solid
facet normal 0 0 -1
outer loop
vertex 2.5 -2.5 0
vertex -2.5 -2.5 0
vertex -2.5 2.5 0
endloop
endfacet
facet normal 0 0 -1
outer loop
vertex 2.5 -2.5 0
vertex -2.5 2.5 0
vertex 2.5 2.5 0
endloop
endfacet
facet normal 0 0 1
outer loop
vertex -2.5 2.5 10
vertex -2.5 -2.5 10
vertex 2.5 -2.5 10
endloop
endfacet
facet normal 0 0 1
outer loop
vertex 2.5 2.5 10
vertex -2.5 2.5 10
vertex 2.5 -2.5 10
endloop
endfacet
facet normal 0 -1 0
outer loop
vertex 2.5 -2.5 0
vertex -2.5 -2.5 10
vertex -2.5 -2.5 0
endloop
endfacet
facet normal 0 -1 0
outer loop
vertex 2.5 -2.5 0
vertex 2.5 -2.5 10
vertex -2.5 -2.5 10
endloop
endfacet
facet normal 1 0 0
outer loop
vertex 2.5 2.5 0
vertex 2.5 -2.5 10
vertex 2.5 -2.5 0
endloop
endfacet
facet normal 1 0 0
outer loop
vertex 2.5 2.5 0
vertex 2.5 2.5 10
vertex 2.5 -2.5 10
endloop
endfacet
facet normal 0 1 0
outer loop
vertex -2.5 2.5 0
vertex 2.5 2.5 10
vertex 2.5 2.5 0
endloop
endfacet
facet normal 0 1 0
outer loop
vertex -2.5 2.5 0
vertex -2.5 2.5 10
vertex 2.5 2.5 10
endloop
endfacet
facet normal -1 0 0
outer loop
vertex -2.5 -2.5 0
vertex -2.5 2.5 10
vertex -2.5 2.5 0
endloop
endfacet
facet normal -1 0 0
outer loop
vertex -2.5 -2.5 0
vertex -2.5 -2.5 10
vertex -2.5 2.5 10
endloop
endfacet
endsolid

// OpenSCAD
// Linear extrusion
linear_extrude(height=10) square(5, center=true);
